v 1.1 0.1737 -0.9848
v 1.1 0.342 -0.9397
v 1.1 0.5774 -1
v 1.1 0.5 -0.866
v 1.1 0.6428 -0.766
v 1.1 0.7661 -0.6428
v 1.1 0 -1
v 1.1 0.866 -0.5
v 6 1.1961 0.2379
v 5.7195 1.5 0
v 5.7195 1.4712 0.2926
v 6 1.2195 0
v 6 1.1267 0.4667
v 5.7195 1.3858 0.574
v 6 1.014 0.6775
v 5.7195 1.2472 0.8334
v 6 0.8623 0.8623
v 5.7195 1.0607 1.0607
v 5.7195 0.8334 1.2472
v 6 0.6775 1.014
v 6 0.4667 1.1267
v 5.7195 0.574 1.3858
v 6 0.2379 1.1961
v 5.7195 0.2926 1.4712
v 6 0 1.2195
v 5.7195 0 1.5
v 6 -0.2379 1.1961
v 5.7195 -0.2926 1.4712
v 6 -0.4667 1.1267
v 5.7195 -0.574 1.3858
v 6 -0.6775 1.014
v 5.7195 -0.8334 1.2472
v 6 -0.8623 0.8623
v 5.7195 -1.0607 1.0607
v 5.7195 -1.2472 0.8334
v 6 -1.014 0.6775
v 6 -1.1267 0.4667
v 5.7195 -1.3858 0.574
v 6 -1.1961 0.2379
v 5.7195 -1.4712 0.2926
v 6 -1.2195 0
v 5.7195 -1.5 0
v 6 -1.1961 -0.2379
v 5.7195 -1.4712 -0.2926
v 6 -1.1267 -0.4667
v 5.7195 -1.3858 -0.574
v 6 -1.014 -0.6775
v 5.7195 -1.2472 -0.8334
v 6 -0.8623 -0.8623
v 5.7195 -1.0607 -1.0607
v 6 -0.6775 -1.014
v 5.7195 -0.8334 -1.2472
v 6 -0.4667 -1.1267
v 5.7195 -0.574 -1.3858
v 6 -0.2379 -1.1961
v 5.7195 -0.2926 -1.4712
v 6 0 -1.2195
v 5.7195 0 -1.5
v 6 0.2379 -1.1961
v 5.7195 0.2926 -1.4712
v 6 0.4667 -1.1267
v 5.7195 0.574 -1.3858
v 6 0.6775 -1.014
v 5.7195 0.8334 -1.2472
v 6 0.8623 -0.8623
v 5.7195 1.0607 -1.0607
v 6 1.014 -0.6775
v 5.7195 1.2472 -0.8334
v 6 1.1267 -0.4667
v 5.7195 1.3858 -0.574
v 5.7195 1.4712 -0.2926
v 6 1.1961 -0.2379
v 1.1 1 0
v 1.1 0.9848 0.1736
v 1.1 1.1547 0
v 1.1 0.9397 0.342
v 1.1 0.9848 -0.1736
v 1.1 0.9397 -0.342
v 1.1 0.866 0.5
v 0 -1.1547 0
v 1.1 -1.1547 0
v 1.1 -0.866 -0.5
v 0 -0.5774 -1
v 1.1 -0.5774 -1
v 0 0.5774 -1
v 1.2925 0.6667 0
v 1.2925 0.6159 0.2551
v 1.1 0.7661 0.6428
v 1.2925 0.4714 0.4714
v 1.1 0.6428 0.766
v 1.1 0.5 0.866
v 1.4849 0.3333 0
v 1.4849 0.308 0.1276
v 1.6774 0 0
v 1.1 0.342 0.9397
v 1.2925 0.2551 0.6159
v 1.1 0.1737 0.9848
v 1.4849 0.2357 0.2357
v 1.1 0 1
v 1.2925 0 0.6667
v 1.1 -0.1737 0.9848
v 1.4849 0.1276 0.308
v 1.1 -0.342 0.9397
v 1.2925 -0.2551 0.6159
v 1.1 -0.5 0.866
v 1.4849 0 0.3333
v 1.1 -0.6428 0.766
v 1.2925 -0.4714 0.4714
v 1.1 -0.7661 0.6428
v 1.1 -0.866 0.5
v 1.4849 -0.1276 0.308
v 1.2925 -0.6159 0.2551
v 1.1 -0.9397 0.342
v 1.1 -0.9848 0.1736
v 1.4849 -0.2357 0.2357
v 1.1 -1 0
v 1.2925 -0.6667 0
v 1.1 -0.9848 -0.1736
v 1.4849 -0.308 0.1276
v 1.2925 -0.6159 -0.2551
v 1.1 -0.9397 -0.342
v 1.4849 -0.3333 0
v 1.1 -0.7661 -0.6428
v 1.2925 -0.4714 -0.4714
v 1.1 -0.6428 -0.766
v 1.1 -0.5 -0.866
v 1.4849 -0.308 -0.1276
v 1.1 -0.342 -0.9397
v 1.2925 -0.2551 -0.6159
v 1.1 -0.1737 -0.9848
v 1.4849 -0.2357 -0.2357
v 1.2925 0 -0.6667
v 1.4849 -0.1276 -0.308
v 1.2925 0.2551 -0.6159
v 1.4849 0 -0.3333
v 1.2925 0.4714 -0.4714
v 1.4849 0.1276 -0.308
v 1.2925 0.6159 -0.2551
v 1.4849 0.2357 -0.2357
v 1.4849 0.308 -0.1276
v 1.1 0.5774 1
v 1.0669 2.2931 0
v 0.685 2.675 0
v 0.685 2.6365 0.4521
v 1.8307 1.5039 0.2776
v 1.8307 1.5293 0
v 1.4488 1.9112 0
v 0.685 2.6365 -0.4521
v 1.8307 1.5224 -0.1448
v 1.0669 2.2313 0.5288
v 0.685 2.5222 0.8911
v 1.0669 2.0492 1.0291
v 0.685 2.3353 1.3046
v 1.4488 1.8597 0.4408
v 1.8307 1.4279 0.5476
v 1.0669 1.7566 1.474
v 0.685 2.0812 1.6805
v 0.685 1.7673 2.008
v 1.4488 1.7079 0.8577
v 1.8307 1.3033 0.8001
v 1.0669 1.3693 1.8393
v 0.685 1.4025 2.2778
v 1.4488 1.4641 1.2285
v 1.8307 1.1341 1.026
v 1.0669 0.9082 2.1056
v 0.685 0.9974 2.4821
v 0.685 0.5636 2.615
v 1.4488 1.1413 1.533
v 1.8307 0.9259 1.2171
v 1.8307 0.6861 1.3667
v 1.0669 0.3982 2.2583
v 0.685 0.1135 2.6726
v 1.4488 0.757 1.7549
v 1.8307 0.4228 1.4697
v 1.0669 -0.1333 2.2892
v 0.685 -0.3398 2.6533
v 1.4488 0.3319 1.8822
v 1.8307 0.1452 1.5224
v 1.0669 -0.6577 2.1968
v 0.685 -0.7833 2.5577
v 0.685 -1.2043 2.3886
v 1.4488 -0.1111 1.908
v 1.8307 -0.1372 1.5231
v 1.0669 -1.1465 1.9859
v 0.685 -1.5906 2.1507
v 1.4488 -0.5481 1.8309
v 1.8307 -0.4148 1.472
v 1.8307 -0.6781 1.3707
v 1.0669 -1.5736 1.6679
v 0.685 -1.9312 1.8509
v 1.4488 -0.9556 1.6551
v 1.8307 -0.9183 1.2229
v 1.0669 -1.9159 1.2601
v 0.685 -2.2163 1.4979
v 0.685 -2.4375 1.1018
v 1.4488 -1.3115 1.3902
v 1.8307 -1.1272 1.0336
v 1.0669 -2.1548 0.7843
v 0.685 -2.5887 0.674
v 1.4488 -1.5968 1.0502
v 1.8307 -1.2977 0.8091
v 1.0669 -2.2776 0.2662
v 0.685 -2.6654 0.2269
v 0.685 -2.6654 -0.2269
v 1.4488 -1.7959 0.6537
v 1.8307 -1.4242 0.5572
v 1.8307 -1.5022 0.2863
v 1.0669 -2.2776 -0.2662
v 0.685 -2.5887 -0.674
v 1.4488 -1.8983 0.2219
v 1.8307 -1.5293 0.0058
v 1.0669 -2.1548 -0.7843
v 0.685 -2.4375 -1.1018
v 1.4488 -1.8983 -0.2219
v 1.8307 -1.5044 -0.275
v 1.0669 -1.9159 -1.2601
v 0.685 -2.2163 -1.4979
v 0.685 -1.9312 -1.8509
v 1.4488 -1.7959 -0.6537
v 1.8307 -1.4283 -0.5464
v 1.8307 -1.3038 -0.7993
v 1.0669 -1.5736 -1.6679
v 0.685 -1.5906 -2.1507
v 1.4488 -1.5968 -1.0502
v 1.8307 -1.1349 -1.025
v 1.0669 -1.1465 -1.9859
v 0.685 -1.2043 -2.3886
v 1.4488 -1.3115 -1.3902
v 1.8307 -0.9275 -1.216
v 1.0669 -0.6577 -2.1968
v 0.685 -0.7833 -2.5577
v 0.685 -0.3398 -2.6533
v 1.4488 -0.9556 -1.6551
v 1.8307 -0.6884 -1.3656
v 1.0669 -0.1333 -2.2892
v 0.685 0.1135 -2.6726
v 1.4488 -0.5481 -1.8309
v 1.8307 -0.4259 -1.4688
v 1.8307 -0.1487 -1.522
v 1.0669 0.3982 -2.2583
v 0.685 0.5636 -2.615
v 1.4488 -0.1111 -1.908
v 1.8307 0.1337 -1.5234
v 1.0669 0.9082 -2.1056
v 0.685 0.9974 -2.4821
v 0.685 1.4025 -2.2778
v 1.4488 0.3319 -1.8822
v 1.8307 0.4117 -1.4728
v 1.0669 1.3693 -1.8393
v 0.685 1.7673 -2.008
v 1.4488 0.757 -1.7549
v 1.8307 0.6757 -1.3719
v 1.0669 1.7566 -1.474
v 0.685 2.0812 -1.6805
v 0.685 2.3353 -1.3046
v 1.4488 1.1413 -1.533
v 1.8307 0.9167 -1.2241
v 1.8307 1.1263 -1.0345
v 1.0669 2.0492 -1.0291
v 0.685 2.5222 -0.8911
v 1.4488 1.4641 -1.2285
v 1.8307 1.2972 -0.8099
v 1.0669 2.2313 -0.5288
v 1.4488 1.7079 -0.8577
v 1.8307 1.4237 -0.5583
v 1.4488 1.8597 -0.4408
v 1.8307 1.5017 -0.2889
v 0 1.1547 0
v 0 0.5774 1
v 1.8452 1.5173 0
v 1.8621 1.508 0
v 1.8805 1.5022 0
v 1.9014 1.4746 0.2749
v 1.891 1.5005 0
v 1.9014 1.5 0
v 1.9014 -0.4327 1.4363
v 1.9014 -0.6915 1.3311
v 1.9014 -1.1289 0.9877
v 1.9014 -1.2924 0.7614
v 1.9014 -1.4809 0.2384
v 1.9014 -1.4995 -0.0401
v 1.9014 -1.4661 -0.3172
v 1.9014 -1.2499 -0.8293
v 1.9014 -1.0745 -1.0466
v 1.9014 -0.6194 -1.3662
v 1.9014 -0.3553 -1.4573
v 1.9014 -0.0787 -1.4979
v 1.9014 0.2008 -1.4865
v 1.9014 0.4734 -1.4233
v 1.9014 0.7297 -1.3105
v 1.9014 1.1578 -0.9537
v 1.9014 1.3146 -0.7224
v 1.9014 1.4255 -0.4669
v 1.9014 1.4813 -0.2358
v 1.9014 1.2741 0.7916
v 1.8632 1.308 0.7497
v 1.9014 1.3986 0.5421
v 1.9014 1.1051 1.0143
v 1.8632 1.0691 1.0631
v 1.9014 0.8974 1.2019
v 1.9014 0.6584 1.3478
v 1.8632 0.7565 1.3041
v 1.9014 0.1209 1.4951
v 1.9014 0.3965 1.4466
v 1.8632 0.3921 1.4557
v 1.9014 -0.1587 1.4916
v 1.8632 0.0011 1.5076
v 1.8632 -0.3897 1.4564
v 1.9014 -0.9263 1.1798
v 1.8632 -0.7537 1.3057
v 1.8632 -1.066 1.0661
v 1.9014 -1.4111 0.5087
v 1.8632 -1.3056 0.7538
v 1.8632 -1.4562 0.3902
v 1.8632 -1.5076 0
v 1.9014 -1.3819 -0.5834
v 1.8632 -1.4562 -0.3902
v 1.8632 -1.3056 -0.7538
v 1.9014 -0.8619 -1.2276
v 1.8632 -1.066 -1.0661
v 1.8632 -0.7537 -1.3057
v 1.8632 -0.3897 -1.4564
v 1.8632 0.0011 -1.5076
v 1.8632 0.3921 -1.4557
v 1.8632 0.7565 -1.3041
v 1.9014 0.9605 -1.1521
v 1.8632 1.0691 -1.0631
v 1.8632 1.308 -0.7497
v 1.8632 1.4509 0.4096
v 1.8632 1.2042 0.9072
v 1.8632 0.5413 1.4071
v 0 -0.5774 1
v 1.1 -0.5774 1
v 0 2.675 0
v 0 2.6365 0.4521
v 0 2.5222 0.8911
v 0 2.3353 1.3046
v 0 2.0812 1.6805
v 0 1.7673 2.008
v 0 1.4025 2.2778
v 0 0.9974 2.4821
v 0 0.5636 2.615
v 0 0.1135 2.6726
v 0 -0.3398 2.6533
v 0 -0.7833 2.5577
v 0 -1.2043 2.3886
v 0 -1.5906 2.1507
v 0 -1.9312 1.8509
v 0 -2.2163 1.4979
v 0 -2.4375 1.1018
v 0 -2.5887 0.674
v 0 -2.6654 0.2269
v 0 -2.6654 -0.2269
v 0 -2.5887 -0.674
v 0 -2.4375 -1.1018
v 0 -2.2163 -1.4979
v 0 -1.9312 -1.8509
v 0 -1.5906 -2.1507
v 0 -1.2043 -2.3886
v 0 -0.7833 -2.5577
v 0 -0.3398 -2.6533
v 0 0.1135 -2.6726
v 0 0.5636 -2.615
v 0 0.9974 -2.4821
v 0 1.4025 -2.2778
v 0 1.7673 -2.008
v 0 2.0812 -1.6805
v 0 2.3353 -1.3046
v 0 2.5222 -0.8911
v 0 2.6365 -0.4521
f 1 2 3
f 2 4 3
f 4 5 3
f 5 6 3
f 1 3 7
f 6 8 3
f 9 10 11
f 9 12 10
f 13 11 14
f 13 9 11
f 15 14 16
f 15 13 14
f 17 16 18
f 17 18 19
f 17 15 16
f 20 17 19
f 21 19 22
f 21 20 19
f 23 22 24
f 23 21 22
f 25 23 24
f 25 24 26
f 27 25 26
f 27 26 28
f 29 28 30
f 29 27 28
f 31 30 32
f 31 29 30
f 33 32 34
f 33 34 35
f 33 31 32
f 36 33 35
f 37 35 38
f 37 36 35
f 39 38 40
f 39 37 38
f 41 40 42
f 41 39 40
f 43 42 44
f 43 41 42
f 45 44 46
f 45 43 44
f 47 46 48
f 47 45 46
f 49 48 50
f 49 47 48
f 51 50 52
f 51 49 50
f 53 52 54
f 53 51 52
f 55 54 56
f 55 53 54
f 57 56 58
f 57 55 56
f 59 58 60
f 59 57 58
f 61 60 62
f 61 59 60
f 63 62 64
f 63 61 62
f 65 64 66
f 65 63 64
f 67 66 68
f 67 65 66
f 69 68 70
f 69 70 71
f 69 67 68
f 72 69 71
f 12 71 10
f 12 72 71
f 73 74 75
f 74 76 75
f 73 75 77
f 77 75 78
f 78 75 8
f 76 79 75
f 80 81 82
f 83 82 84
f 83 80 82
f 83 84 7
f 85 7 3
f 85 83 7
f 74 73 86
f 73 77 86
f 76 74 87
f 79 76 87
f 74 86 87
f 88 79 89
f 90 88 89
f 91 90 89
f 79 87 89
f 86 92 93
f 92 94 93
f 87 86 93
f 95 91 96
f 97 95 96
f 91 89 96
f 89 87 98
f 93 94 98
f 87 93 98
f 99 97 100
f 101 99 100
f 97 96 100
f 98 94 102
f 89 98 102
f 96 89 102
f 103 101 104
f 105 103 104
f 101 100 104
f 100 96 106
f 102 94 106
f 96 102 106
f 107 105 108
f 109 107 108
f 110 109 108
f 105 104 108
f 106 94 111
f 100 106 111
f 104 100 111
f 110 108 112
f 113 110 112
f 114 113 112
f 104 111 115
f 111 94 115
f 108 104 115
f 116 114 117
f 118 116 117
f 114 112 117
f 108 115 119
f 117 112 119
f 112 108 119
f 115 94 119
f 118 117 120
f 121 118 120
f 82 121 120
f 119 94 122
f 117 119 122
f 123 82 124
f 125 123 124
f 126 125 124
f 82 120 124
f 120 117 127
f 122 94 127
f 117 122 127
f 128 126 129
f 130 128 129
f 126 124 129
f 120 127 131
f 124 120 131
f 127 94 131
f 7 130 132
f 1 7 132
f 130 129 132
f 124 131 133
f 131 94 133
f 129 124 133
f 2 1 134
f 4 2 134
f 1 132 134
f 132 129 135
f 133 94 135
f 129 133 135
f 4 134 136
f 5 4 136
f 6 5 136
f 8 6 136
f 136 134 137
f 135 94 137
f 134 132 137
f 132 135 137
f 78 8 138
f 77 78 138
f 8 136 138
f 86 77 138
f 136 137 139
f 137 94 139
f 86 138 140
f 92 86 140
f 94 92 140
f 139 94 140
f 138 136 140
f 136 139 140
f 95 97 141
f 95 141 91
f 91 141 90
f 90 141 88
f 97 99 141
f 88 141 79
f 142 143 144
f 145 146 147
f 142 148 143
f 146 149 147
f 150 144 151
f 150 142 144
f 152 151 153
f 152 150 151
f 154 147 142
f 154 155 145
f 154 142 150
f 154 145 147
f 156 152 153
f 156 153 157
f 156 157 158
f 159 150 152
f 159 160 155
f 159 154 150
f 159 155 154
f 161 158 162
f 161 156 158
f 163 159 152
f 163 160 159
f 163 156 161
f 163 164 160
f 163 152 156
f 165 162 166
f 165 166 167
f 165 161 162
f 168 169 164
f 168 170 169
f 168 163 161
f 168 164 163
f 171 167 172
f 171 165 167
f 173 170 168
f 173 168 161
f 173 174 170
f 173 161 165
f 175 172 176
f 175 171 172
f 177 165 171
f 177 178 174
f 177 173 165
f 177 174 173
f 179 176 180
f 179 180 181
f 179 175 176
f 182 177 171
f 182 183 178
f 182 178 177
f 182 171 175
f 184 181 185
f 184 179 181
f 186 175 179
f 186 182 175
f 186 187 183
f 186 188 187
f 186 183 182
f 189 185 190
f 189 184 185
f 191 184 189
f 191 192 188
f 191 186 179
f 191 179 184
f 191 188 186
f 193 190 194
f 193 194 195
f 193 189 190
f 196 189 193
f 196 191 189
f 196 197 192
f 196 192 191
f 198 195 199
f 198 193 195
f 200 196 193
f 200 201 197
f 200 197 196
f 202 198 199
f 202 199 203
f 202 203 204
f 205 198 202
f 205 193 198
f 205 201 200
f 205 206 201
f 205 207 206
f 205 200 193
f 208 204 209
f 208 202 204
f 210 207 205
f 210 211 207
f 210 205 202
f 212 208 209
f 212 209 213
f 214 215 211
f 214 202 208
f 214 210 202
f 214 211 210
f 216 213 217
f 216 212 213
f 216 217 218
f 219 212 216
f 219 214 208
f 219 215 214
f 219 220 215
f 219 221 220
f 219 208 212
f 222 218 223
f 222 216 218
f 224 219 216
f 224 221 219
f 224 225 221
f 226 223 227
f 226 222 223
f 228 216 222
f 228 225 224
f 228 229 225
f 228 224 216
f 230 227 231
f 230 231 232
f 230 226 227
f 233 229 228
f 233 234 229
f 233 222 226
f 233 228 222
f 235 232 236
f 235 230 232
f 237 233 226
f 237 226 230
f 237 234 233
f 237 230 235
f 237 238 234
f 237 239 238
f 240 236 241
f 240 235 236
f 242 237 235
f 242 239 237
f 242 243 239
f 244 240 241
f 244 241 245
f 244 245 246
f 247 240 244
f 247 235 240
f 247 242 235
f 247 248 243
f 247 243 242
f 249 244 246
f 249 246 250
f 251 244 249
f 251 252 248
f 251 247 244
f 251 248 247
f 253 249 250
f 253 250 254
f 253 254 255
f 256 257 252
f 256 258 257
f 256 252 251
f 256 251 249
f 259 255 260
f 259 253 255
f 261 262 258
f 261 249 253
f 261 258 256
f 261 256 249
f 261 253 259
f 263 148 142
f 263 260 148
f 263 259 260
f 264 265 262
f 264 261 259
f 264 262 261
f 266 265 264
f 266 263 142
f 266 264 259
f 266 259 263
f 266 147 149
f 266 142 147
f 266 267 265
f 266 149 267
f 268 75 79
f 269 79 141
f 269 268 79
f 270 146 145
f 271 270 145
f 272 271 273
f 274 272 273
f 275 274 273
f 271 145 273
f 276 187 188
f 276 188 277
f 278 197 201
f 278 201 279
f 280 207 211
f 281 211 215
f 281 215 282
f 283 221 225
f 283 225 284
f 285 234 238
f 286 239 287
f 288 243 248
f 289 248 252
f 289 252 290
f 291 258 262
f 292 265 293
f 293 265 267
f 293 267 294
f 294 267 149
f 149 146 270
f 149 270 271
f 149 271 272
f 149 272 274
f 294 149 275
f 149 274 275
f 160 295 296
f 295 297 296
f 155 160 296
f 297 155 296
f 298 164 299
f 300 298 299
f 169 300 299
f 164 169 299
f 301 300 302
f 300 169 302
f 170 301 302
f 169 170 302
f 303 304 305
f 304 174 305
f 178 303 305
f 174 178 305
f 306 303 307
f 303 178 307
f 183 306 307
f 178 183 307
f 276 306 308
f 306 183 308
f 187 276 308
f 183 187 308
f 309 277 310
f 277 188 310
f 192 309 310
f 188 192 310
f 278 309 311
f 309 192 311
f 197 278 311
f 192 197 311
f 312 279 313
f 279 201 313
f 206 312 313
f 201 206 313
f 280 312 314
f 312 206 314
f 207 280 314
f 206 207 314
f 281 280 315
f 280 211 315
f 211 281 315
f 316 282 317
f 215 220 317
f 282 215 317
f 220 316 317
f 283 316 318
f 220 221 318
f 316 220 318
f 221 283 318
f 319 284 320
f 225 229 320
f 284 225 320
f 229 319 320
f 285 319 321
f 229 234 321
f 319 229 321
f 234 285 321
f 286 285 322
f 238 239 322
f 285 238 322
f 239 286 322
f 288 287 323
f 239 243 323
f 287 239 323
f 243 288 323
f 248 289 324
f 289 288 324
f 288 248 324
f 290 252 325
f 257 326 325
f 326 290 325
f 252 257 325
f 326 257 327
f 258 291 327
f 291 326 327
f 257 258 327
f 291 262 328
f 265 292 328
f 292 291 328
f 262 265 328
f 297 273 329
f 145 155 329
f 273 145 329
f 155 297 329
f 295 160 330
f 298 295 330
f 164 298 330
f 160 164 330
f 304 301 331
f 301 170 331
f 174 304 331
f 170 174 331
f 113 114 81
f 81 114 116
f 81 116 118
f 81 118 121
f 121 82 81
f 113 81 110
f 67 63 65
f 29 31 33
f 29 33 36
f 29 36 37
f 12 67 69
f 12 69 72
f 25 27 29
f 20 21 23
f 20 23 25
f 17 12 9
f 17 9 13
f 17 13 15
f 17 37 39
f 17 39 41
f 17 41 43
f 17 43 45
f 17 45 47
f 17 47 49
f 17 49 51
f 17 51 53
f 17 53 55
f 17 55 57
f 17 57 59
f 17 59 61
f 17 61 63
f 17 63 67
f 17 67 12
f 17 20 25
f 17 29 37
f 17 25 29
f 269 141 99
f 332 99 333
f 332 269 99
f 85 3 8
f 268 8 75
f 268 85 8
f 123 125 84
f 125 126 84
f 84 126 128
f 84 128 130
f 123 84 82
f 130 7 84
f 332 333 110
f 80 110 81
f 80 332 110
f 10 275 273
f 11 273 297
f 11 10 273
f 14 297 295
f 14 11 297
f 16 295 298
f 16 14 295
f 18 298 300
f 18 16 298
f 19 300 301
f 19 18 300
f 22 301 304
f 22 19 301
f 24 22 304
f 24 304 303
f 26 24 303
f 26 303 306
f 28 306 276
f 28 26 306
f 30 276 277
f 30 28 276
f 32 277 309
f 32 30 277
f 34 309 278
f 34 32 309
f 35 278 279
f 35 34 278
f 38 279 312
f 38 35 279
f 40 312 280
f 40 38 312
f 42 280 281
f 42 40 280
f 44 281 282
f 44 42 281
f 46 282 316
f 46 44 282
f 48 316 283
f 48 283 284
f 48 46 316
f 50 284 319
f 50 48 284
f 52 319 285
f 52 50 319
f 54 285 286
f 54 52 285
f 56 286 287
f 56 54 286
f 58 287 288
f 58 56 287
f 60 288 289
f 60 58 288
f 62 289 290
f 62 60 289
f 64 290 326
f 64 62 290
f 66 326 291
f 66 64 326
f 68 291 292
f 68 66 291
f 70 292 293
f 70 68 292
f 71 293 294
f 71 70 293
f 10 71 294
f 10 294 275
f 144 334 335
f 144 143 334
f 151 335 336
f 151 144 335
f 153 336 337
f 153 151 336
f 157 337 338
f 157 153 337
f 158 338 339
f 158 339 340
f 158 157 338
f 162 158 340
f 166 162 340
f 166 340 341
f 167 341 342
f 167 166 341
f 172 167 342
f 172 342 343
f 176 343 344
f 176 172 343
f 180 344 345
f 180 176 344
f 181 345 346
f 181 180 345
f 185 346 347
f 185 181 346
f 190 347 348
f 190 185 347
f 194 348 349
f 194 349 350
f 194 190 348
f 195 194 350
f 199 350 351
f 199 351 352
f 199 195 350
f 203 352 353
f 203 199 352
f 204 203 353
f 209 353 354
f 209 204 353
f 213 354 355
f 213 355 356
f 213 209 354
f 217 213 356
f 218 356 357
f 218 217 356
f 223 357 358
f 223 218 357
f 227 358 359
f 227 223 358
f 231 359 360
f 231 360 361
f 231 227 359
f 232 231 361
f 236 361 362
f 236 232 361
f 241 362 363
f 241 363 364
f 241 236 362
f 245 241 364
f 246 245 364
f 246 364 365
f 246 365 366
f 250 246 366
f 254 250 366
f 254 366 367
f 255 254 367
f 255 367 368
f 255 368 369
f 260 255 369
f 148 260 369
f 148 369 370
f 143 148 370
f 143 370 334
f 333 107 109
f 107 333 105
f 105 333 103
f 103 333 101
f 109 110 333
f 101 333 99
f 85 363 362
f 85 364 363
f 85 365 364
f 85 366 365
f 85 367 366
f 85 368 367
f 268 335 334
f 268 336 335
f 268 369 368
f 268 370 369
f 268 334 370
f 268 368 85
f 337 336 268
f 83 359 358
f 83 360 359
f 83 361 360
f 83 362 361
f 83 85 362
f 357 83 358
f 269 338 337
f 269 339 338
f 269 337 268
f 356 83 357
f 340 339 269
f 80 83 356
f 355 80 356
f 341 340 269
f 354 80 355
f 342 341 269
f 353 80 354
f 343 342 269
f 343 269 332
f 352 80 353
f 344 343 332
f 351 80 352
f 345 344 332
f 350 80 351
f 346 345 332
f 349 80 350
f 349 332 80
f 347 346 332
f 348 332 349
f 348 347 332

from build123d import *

# Parameters (mm, degrees)
FILLET1_R   = 0.1
HEX_2_DEPTH = 1.1


with BuildPart() as part:
    # BodySke → BaseBody (revolve)
    with BuildSketch(Plane.XY):
        Polygon((0, 0), (0, 2.675), (0.685, 2.675), (1.86, 1.5), (5.7195, 1.5), (6, 1.2195), (6, 0), align=None)
    revolve(axis=Axis((0, 0, 0), (1, 0, 0)))

    # Fillet1
    fillet1_edges = [part.edges().sort_by_distance(p)[0] for p in [
        (1.86, -1.5, 0),
    ]]
    fillet(fillet1_edges, radius=FILLET1_R)

    # Sketch2 → PreBroach (revolve, cut)
    with BuildSketch(Plane.XY):
        Polygon((0, 1), (1.1, 1), (1.677350269, 0), (0, 0), align=None)
    revolve(axis=Axis((0, 0, 0), (1, 0, 0)), mode=Mode.SUBTRACT)

    # Sketch3 → Hex 2 (cut)
    with BuildSketch(Plane.ZY):
        Polygon((-1, -0.577350269), (-1, 0.577350269), (0, 1.154700538), (1, 0.577350269), (1, -0.577350269), (0, -1.154700538), align=None)
    extrude(amount=-HEX_2_DEPTH, mode=Mode.SUBTRACT)


solid = part.part
